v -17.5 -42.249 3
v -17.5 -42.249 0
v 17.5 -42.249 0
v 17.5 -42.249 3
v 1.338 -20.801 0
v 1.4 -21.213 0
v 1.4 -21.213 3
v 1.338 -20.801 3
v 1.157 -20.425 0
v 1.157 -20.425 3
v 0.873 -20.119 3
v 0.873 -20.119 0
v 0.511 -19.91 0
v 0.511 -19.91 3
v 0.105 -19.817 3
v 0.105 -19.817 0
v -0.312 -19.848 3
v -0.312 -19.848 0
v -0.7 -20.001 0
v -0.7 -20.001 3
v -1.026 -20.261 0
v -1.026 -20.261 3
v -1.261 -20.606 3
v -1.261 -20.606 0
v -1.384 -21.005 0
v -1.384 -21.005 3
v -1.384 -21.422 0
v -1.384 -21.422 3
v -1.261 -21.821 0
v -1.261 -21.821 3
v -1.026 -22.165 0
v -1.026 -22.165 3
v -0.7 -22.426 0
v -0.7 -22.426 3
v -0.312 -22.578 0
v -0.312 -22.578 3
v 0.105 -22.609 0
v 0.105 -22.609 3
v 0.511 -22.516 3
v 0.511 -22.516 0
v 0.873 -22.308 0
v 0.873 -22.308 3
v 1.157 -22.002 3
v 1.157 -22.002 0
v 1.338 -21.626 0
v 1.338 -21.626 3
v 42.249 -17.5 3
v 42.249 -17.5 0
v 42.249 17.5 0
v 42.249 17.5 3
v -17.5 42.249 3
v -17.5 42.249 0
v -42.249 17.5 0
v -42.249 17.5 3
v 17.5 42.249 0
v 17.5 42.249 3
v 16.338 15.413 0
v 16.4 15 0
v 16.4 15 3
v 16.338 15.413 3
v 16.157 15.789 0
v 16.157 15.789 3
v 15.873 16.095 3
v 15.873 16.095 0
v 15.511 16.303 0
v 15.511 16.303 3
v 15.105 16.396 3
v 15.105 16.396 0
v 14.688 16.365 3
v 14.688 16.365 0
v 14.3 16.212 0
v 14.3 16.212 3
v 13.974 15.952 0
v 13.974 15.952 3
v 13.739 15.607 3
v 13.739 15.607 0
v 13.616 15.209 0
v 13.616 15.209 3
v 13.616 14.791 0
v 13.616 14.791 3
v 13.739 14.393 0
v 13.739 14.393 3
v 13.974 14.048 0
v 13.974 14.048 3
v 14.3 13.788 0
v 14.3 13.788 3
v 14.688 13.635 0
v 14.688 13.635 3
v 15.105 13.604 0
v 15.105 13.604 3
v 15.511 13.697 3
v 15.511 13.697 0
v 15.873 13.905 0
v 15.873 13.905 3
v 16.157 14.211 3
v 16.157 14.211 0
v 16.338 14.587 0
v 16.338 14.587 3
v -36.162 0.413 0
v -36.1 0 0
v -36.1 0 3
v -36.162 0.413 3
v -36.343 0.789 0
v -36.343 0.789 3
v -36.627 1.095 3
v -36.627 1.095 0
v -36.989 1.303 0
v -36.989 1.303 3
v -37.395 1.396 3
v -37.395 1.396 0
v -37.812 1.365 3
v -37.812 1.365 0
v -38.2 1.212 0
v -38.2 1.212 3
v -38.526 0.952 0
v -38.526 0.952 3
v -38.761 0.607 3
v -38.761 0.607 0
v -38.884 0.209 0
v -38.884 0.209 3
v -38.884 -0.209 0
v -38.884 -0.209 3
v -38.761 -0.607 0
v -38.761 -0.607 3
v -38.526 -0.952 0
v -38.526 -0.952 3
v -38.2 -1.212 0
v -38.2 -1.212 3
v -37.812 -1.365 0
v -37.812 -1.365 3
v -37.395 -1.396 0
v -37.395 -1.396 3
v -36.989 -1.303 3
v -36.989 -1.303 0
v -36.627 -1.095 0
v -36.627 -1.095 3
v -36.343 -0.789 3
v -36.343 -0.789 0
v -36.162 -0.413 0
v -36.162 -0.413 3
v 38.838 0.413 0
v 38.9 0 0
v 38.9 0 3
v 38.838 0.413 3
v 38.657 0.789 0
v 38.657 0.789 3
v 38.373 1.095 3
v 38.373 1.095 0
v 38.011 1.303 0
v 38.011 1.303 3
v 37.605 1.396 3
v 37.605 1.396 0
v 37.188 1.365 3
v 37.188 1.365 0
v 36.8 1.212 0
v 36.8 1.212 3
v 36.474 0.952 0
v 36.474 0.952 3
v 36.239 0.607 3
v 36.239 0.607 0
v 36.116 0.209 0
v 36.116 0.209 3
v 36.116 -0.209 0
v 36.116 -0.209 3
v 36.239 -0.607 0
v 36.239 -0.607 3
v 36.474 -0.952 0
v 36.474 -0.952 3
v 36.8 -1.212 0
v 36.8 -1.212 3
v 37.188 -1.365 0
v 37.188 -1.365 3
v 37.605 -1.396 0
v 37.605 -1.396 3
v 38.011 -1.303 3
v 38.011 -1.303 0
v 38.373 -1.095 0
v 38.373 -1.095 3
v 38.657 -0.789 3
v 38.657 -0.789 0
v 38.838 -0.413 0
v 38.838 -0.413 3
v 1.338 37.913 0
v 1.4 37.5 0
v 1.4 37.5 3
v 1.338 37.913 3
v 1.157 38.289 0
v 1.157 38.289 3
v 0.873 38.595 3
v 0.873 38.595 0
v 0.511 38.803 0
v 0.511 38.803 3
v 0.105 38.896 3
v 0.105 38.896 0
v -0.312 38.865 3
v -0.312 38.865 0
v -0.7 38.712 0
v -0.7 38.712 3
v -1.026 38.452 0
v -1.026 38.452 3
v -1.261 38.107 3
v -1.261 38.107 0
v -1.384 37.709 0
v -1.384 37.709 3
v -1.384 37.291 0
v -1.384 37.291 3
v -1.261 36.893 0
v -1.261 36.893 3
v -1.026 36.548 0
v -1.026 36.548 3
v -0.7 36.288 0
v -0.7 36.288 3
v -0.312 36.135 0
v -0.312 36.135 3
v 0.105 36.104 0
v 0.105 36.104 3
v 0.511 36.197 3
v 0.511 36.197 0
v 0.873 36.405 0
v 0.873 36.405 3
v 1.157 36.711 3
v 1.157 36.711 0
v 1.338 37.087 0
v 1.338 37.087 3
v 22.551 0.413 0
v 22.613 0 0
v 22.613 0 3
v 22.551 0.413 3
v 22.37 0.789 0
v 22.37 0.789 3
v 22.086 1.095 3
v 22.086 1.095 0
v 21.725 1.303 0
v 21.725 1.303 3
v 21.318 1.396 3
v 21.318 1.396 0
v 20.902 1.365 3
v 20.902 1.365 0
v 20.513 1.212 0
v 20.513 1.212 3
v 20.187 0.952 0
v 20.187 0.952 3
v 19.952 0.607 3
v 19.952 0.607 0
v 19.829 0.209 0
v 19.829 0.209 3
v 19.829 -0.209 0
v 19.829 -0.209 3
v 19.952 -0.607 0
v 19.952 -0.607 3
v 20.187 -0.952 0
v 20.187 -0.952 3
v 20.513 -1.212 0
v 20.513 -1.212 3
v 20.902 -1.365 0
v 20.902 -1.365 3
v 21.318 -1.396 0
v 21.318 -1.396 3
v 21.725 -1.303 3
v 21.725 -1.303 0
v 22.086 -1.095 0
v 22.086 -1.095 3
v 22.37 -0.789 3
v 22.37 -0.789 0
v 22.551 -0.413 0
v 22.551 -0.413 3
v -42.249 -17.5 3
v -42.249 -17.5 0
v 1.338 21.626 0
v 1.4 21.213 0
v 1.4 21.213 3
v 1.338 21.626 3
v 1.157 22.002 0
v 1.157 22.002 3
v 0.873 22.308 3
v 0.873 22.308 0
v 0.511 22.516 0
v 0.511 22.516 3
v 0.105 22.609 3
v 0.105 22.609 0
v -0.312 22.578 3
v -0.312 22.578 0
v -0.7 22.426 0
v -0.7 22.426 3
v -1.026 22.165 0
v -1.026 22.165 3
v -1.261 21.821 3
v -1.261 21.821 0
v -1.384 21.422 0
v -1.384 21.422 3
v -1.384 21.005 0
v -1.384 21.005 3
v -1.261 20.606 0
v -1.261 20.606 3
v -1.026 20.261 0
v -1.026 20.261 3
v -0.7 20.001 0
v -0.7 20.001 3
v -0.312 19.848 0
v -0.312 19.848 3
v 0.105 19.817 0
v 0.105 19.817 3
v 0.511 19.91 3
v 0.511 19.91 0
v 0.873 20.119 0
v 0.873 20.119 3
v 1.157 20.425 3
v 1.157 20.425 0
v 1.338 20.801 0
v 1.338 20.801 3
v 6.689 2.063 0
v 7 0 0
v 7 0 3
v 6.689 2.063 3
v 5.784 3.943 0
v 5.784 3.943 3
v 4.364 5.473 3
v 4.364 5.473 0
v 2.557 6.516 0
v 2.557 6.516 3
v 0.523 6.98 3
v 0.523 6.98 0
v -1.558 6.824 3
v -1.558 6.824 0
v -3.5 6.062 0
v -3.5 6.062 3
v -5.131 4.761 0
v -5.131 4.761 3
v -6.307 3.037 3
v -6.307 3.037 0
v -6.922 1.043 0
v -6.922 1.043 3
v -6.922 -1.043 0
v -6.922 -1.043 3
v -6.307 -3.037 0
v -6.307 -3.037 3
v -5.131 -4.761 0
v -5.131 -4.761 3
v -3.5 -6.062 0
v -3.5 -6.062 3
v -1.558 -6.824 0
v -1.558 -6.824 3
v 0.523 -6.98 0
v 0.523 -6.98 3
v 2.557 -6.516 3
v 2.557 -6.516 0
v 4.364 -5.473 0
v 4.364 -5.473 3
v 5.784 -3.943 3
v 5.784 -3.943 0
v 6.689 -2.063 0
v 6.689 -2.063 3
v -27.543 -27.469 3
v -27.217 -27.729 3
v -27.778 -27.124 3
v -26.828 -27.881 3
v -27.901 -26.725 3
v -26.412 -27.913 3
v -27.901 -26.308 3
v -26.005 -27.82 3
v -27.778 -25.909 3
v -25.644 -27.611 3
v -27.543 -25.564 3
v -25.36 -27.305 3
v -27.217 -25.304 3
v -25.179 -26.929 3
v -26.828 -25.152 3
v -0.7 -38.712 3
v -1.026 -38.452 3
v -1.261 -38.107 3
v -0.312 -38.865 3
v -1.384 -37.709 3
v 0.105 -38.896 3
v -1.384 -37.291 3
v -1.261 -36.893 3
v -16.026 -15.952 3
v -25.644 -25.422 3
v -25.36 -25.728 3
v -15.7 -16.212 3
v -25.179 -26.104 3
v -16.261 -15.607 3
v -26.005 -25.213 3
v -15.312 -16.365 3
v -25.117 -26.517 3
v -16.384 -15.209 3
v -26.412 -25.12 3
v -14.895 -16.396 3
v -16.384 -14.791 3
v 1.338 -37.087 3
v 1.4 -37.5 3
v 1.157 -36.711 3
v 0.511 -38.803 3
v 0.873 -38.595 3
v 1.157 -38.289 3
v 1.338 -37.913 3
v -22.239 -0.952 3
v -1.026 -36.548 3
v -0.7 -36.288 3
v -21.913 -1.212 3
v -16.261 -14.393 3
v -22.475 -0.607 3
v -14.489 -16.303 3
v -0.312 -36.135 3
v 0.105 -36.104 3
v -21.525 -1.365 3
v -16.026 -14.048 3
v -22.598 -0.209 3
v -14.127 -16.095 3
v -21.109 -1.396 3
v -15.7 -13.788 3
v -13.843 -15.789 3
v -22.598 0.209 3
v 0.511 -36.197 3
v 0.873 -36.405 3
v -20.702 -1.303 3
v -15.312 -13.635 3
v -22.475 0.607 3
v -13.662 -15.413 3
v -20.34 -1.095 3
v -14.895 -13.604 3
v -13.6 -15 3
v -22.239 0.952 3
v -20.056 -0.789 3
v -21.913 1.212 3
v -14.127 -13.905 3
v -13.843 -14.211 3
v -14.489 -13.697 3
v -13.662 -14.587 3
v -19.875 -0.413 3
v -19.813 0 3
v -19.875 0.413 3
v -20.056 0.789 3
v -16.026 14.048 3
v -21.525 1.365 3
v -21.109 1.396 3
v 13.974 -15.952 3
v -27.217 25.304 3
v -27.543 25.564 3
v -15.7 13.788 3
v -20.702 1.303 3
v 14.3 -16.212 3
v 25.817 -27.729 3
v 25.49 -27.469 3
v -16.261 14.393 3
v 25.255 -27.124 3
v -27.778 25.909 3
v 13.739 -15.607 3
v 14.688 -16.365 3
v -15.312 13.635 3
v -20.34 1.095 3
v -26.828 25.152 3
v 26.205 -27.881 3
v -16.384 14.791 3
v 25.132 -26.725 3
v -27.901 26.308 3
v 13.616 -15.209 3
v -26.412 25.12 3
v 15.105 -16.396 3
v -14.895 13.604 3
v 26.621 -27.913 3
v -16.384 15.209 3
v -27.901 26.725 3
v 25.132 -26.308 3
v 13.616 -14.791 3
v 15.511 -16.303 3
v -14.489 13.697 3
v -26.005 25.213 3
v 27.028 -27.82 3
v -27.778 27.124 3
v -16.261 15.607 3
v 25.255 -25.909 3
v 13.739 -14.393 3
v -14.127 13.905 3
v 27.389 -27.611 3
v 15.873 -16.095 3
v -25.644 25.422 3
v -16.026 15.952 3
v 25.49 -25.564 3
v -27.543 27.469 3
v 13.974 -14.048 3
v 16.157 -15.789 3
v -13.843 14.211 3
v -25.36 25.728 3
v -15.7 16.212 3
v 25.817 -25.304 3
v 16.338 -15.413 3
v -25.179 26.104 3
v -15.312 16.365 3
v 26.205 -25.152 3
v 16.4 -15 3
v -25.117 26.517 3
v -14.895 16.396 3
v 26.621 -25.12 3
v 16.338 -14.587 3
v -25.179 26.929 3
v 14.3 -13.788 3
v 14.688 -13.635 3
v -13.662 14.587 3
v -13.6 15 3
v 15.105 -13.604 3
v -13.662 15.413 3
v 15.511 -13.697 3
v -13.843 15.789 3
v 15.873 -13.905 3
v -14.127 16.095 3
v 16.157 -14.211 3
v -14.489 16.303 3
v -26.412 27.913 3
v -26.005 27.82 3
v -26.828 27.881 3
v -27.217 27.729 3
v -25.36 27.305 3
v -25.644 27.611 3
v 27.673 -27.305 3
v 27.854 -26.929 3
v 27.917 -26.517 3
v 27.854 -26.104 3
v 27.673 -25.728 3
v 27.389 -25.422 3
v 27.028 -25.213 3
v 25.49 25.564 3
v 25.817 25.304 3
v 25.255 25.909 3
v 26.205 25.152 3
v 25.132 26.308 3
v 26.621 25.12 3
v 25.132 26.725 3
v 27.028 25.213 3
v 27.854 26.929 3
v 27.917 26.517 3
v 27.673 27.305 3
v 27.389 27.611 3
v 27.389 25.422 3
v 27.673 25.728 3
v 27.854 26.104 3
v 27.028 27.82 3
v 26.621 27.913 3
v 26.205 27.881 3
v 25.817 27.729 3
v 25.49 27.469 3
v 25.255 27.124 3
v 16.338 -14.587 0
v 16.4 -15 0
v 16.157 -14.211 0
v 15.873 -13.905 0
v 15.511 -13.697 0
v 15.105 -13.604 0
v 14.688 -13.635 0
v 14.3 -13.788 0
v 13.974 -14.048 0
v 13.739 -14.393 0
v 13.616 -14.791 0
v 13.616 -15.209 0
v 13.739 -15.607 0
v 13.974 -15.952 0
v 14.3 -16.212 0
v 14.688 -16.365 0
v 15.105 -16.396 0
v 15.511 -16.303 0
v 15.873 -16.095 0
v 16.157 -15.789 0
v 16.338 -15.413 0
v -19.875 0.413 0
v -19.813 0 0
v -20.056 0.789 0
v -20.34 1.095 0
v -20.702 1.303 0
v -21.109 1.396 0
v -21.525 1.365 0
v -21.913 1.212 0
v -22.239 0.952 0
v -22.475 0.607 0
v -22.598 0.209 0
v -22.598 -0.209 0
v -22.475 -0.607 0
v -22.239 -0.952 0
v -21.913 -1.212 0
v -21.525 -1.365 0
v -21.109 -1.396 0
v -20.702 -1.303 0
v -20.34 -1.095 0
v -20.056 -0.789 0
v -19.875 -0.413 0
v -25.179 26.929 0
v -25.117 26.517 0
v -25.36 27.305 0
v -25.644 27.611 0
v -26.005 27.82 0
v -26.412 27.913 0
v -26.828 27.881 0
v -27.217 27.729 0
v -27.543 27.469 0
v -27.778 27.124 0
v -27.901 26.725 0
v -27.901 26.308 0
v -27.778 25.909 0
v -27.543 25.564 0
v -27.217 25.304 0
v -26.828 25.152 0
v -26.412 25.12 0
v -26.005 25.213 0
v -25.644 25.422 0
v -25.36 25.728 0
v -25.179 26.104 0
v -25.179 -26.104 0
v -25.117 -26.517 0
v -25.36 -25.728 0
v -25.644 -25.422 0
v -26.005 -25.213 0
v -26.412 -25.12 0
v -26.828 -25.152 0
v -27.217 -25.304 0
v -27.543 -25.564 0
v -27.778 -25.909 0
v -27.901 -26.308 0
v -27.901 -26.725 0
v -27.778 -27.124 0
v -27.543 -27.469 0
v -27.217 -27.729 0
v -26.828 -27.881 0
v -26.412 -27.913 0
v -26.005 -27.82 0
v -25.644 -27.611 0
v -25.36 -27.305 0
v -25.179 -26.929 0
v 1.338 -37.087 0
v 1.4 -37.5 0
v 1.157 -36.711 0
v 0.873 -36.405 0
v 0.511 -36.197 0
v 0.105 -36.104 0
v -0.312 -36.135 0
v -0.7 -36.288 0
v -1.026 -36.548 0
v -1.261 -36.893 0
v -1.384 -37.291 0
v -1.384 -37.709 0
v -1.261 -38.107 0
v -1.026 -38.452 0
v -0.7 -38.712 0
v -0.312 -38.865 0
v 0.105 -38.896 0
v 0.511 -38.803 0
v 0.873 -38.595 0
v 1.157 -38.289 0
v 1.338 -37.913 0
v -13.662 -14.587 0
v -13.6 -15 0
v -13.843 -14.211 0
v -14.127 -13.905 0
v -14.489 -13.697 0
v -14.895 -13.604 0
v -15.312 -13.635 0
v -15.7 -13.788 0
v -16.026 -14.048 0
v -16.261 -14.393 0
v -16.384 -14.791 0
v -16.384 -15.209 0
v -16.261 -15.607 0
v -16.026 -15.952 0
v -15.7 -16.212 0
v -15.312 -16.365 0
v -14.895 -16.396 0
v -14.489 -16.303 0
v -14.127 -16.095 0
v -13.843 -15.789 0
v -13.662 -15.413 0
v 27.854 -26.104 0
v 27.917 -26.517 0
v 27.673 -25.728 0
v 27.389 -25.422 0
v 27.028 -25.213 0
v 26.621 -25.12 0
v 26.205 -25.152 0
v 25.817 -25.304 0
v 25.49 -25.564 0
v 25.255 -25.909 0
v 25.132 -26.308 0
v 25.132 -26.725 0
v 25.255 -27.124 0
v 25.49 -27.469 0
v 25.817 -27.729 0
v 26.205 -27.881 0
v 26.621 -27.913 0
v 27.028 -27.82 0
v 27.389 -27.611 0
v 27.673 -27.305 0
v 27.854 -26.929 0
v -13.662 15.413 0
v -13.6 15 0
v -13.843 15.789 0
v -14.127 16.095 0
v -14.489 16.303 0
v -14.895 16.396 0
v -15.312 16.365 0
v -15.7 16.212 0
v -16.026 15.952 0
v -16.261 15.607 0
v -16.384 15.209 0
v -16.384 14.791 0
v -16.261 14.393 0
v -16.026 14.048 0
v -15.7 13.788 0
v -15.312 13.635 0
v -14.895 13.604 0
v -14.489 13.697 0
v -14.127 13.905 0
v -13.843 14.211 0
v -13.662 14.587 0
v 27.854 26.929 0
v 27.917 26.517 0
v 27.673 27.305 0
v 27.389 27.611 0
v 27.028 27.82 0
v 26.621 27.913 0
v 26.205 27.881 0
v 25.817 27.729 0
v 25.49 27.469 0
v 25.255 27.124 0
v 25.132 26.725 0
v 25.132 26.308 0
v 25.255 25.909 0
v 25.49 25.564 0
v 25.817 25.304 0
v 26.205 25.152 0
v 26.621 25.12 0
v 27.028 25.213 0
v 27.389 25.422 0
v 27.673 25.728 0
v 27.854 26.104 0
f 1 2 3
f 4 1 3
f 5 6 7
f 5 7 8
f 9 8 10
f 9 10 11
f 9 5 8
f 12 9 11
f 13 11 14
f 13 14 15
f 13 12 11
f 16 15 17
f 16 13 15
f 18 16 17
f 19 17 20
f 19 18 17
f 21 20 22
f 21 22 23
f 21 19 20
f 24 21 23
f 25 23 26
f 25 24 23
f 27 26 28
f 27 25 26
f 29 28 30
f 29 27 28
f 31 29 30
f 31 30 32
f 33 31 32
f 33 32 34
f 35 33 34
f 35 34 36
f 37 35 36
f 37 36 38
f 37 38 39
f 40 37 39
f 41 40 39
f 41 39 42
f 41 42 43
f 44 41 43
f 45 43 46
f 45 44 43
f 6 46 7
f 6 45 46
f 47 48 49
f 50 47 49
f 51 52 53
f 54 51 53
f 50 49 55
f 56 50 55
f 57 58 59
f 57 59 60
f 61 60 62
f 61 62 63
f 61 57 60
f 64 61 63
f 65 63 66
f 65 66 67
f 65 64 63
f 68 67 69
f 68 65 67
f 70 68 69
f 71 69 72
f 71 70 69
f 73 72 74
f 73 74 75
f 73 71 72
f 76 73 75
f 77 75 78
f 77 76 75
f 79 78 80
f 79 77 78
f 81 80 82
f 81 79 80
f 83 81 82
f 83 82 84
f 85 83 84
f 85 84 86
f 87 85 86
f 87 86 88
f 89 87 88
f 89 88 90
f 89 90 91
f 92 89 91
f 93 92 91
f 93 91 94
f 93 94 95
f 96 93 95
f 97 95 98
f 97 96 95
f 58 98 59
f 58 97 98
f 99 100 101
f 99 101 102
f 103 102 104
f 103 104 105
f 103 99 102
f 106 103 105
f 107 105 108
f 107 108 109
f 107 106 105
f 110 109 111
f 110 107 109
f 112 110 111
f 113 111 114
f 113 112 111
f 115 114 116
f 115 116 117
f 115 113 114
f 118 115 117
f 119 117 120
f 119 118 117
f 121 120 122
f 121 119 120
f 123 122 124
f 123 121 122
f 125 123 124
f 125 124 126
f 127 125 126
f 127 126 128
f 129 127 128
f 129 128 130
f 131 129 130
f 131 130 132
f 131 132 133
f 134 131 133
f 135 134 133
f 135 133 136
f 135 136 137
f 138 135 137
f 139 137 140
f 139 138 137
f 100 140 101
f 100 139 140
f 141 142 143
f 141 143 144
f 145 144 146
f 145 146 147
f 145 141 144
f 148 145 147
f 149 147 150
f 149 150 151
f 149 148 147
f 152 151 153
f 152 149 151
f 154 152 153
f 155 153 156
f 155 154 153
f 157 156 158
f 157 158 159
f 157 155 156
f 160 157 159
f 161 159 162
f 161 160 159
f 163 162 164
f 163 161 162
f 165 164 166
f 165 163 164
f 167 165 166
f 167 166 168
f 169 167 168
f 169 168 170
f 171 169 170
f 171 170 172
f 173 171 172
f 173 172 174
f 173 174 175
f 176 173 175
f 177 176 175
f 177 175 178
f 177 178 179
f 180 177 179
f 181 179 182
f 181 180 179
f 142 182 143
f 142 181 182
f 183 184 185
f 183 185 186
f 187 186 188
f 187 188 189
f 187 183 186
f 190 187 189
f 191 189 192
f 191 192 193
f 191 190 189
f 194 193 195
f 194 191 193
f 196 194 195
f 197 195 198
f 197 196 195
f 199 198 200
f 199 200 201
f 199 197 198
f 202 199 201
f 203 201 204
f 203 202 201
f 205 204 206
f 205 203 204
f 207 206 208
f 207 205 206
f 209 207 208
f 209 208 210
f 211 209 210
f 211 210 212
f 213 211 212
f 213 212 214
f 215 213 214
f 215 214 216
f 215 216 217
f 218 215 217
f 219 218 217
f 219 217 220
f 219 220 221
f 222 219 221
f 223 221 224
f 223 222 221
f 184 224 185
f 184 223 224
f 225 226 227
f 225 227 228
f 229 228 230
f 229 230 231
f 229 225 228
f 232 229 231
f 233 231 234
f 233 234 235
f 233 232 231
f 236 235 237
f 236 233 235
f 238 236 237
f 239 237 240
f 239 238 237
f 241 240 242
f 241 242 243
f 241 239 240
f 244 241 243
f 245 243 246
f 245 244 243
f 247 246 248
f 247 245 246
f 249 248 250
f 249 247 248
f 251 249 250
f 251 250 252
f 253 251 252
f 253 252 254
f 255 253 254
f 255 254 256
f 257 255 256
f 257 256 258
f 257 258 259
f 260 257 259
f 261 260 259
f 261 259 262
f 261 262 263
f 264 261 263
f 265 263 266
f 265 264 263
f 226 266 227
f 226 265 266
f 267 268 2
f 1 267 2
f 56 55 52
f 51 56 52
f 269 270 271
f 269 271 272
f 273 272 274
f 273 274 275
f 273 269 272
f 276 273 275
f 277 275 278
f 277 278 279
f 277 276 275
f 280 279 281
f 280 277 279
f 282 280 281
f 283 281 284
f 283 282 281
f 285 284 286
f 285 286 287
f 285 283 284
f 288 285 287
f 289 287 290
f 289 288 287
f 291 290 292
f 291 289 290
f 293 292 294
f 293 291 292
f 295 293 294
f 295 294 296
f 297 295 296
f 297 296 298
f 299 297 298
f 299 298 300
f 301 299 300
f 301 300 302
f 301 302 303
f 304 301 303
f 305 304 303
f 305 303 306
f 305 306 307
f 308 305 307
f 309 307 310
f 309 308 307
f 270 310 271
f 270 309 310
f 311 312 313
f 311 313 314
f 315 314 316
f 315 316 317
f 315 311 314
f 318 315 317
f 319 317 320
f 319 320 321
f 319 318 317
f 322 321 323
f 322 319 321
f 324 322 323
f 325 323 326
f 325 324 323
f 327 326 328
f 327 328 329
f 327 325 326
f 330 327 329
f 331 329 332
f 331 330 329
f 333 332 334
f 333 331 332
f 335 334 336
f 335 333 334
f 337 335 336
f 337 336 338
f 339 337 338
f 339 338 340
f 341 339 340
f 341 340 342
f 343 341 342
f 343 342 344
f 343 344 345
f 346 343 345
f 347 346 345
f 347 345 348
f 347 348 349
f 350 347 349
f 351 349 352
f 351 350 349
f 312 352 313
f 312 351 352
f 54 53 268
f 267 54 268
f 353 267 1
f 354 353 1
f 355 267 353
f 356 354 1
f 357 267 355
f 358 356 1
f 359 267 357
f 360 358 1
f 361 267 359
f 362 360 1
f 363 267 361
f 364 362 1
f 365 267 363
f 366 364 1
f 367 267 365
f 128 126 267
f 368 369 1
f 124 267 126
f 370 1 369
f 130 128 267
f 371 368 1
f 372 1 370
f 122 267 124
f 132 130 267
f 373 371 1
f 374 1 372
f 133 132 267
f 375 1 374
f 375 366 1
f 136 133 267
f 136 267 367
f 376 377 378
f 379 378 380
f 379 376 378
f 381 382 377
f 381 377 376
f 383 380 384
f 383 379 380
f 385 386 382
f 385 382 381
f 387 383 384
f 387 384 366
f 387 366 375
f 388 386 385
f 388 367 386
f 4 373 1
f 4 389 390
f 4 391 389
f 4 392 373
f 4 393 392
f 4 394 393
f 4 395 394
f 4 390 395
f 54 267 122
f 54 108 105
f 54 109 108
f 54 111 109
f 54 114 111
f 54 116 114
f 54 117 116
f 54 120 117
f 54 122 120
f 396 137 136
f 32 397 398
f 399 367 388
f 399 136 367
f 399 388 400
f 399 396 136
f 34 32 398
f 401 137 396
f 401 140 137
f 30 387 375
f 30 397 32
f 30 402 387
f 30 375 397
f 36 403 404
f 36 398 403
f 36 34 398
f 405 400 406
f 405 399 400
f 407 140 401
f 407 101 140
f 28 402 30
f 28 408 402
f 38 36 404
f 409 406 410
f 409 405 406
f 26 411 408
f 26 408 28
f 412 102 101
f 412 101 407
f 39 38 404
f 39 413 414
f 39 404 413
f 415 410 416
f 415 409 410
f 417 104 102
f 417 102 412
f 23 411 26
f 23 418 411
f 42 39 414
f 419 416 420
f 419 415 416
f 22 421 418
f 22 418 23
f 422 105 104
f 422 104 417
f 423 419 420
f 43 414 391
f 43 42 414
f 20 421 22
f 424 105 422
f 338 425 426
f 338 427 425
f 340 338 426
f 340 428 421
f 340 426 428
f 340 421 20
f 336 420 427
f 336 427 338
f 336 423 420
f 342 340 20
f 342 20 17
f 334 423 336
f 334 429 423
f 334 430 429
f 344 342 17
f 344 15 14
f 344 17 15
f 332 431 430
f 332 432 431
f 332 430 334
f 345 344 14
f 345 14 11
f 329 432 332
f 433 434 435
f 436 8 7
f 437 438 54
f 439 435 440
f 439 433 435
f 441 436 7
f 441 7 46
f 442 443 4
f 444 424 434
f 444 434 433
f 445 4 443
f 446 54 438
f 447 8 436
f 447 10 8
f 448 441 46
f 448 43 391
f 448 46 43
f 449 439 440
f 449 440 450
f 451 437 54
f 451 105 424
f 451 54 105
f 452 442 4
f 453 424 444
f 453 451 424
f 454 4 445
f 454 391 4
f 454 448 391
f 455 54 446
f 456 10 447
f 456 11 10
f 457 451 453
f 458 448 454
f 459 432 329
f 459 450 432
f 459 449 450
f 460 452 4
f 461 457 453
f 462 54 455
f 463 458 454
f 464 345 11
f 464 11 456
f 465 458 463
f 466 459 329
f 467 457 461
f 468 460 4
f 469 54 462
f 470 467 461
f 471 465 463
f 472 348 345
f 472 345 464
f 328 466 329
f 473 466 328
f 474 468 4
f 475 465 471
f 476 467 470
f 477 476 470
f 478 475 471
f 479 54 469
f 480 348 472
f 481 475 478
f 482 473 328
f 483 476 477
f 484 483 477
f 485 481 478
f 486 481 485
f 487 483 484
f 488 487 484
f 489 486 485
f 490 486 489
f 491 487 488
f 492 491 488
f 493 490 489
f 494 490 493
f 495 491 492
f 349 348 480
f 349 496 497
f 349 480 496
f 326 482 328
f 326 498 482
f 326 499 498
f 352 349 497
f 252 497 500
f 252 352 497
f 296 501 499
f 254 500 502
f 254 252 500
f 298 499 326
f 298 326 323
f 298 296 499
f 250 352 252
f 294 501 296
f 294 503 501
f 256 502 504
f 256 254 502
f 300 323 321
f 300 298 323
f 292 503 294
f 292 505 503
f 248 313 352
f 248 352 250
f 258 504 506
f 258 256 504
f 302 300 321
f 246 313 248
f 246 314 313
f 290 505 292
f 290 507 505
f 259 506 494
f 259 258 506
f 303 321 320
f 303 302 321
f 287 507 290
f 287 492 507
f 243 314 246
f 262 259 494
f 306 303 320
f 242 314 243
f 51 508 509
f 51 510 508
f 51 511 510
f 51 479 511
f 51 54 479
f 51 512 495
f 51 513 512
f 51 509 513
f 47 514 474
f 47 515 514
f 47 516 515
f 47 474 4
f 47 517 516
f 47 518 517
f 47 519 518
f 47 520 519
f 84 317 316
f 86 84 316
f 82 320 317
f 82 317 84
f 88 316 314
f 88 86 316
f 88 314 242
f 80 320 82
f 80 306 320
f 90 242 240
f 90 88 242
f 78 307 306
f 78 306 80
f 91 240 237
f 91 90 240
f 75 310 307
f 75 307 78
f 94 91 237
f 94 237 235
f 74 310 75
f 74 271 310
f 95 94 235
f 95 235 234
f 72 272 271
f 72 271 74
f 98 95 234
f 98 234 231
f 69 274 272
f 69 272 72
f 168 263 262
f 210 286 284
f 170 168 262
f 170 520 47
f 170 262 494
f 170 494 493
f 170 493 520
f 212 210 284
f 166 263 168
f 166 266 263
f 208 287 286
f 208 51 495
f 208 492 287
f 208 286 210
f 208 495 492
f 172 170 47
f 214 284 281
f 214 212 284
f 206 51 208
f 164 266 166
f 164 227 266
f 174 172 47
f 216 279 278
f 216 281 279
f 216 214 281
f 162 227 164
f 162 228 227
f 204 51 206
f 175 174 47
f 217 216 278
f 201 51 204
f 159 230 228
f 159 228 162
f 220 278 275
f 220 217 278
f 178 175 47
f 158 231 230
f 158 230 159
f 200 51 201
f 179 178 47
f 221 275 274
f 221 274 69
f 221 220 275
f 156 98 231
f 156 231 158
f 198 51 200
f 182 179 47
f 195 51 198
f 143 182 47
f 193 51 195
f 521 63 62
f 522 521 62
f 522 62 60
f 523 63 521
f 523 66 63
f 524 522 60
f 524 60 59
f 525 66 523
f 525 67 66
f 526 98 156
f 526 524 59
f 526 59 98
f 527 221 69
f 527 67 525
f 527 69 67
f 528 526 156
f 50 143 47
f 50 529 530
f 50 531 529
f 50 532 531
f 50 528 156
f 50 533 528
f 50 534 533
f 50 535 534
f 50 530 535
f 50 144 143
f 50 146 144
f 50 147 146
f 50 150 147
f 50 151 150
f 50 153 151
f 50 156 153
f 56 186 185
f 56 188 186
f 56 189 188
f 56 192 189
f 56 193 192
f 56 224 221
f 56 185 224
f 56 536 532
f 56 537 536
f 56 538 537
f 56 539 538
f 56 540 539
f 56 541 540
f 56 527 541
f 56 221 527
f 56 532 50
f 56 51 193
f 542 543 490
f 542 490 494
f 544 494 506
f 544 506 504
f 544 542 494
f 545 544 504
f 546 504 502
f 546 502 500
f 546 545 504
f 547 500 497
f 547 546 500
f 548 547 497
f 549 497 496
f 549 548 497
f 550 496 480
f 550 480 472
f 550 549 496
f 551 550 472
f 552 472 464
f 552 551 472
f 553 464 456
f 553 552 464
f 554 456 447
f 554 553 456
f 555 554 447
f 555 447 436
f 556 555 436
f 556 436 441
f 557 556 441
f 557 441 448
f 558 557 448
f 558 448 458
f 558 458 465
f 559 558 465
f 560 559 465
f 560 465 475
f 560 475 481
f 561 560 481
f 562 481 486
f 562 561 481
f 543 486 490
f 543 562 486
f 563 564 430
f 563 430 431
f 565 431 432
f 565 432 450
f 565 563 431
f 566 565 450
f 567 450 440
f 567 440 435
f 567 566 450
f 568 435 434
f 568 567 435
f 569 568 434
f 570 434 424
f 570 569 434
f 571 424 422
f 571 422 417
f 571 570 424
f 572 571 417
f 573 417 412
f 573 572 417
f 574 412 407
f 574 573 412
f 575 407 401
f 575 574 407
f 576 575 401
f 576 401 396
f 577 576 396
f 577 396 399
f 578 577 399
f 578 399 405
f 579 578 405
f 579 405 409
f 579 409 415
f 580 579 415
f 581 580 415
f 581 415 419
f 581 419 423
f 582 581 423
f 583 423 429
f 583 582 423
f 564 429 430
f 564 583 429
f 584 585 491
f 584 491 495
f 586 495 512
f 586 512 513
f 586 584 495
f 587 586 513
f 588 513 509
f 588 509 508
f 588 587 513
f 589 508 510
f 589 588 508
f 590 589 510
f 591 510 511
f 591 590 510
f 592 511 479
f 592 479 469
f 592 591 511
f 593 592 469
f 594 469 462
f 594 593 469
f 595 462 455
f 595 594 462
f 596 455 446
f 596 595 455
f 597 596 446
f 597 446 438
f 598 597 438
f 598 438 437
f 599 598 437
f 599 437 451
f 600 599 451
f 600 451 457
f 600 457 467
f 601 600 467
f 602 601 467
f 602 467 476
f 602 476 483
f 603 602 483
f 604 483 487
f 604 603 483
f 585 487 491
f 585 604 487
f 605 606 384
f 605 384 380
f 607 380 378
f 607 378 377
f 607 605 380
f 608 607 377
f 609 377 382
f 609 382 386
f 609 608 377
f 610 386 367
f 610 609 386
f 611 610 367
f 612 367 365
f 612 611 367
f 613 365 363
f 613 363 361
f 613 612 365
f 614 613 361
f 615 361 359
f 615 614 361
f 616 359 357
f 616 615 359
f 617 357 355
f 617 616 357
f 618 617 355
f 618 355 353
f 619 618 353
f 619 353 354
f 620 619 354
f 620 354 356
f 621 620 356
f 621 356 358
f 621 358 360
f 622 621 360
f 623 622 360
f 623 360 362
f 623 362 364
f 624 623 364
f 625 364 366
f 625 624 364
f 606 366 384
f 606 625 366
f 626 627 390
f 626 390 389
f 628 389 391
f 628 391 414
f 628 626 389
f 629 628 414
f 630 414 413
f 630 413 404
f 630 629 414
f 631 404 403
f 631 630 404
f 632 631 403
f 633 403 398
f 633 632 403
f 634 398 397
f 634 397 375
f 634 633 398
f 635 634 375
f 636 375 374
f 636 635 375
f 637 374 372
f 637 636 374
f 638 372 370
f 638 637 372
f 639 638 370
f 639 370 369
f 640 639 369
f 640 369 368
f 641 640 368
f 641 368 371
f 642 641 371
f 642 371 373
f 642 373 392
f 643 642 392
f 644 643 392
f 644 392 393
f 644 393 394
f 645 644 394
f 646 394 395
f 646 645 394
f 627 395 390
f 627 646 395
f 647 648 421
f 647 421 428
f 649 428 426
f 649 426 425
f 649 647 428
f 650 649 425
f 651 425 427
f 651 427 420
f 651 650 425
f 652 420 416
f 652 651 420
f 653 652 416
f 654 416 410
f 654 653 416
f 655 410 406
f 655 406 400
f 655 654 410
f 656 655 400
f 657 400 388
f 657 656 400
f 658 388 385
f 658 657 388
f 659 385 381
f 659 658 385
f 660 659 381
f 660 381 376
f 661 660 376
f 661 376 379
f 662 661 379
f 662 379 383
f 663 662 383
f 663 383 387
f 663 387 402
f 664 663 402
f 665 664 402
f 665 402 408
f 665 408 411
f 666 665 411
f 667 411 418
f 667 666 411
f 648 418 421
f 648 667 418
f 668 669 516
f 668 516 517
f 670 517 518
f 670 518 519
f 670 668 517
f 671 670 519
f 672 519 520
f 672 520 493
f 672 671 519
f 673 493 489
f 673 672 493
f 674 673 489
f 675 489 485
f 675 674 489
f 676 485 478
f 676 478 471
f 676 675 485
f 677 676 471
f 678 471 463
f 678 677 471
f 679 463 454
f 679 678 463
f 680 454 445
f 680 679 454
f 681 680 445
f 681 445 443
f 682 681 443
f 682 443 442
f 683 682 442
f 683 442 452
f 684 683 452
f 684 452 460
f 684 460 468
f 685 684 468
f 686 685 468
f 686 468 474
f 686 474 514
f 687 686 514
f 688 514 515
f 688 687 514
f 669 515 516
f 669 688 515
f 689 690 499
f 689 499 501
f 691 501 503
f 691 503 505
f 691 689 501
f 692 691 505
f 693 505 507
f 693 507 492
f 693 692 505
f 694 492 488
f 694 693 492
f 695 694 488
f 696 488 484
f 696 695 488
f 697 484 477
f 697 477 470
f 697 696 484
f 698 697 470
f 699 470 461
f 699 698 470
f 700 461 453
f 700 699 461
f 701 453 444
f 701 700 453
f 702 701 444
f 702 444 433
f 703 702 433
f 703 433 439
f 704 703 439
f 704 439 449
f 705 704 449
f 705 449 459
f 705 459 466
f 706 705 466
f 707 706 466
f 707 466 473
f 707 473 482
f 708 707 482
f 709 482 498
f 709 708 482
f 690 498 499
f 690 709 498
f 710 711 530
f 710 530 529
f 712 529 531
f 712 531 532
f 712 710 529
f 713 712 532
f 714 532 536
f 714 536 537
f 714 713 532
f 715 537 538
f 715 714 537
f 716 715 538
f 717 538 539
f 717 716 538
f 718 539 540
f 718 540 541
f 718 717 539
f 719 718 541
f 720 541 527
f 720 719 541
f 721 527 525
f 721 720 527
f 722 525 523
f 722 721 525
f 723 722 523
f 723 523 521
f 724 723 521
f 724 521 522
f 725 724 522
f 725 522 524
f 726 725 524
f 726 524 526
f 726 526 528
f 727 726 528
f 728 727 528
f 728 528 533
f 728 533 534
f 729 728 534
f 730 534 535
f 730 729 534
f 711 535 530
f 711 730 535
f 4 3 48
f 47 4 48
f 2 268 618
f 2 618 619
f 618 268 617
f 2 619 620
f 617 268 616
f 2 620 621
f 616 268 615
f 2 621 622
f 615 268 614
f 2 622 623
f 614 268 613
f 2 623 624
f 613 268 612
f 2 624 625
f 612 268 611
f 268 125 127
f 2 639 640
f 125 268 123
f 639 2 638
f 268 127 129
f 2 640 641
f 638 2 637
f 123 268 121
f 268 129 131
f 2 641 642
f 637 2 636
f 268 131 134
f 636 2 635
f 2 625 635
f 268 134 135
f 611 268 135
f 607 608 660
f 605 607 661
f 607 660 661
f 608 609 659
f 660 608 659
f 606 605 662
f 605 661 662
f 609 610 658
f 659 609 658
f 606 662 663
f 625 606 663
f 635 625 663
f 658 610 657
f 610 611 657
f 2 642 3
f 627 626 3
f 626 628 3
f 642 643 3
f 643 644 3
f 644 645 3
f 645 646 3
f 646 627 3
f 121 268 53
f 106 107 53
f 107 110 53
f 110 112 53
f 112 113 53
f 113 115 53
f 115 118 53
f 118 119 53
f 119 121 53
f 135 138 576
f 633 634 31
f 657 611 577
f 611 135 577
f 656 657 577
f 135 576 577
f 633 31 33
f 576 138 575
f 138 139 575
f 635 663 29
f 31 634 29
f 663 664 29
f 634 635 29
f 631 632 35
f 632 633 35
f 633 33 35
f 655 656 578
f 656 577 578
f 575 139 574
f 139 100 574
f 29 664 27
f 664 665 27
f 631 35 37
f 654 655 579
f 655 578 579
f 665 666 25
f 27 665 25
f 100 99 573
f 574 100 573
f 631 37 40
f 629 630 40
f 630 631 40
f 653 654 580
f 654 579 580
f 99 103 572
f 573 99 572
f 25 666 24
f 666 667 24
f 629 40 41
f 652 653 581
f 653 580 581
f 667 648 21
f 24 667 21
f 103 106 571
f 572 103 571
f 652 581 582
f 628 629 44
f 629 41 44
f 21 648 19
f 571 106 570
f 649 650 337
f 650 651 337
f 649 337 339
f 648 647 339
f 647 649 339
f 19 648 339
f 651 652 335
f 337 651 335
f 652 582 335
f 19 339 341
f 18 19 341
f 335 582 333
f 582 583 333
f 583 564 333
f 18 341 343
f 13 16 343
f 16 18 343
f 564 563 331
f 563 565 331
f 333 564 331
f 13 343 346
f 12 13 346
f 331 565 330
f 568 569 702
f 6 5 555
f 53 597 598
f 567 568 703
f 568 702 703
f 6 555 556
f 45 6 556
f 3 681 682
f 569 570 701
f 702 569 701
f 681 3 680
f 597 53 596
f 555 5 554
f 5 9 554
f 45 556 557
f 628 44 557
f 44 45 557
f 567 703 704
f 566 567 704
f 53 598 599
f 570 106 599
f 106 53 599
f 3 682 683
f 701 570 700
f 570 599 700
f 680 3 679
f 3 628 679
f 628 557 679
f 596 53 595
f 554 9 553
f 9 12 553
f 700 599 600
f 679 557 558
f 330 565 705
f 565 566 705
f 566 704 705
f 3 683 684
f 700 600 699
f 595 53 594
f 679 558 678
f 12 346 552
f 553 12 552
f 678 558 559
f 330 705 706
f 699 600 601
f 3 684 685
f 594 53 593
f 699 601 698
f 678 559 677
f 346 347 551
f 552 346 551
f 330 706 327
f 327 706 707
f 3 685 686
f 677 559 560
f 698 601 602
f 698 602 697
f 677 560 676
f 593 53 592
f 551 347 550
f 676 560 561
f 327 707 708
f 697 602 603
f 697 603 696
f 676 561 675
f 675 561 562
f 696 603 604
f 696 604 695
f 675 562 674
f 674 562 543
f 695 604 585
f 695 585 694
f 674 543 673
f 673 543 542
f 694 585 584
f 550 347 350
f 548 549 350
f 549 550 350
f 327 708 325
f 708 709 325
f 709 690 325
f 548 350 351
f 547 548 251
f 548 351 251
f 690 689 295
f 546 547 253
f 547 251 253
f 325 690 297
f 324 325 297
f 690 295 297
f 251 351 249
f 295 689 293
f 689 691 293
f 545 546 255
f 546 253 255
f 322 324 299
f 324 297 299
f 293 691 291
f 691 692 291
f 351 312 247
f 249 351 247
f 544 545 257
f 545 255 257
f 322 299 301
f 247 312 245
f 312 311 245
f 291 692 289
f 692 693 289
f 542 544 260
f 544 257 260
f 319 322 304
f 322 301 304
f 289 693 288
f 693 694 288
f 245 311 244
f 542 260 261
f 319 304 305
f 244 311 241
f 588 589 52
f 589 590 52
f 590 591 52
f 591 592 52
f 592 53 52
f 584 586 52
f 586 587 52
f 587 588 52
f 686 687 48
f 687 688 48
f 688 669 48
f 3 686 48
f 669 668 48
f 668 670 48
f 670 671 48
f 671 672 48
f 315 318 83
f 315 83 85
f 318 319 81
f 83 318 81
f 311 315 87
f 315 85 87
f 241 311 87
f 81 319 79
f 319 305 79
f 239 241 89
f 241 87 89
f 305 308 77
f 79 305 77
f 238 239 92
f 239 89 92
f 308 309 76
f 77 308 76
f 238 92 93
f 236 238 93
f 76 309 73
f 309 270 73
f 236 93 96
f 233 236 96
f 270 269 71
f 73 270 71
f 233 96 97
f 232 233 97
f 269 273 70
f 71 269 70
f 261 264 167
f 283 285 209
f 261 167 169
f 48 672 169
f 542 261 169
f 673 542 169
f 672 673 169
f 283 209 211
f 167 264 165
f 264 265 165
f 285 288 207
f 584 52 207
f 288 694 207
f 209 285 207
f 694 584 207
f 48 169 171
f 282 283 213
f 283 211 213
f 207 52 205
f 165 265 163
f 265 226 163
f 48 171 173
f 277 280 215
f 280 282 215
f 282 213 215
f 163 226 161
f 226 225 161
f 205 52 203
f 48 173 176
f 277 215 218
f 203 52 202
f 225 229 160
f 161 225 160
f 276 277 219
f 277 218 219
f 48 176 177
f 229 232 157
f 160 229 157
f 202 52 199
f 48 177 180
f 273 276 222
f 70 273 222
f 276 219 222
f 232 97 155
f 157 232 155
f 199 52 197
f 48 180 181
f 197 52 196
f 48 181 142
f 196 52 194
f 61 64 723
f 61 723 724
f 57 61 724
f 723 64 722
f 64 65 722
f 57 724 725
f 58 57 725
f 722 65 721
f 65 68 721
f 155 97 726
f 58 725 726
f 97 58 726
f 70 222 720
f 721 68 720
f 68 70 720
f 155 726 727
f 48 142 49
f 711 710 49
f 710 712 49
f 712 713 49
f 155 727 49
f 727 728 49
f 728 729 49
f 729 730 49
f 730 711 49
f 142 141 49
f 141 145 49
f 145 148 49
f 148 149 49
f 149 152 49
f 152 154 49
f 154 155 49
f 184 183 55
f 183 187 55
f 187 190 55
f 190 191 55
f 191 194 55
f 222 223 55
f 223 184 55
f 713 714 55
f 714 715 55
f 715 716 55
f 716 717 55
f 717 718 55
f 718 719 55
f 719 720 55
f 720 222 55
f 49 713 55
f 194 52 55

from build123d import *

# Parameters (mm, degrees)
F0_R     = 1.4
F0_R_2   = 7
F1_DEPTH = 3


with BuildPart() as f1:
    # F0 (on Top) → F1 (new body)
    with BuildSketch(Plane.XY):
        Polygon((17.5, 42.248737), (-17.5, 42.248737), (-42.248737, 17.5), (-42.248737, -17.5), (-17.5, -42.248737), (17.5, -42.248737), (42.248737, -17.5), (42.248737, 17.5), align=None)
        with Locations((-26.516504, -26.516504)):
            Circle(F0_R, mode=Mode.SUBTRACT)
        with Locations((-37.5, 0)):
            Circle(F0_R, mode=Mode.SUBTRACT)
        with Locations((-21.213203, 0)):
            Circle(F0_R, mode=Mode.SUBTRACT)
        with Locations((-15, -15)):
            Circle(F0_R, mode=Mode.SUBTRACT)
        with Locations((0, -37.5)):
            Circle(F0_R, mode=Mode.SUBTRACT)
        with Locations((0, -21.213203)):
            Circle(F0_R, mode=Mode.SUBTRACT)
        with Locations((26.516504, -26.516504)):
            Circle(F0_R, mode=Mode.SUBTRACT)
        with Locations((15, -15)):
            Circle(F0_R, mode=Mode.SUBTRACT)
        Circle(F0_R_2, mode=Mode.SUBTRACT)
        with Locations((21.213203, 0)):
            Circle(F0_R, mode=Mode.SUBTRACT)
        with Locations((37.5, 0)):
            Circle(F0_R, mode=Mode.SUBTRACT)
        with Locations((-15, 15)):
            Circle(F0_R, mode=Mode.SUBTRACT)
        with Locations((-26.516504, 26.516504)):
            Circle(F0_R, mode=Mode.SUBTRACT)
        with Locations((15, 15)):
            Circle(F0_R, mode=Mode.SUBTRACT)
        with Locations((0, 21.213203)):
            Circle(F0_R, mode=Mode.SUBTRACT)
        with Locations((0, 37.5)):
            Circle(F0_R, mode=Mode.SUBTRACT)
        with Locations((26.516504, 26.516504)):
            Circle(F0_R, mode=Mode.SUBTRACT)
    extrude(amount=F1_DEPTH)


solid = f1.part
